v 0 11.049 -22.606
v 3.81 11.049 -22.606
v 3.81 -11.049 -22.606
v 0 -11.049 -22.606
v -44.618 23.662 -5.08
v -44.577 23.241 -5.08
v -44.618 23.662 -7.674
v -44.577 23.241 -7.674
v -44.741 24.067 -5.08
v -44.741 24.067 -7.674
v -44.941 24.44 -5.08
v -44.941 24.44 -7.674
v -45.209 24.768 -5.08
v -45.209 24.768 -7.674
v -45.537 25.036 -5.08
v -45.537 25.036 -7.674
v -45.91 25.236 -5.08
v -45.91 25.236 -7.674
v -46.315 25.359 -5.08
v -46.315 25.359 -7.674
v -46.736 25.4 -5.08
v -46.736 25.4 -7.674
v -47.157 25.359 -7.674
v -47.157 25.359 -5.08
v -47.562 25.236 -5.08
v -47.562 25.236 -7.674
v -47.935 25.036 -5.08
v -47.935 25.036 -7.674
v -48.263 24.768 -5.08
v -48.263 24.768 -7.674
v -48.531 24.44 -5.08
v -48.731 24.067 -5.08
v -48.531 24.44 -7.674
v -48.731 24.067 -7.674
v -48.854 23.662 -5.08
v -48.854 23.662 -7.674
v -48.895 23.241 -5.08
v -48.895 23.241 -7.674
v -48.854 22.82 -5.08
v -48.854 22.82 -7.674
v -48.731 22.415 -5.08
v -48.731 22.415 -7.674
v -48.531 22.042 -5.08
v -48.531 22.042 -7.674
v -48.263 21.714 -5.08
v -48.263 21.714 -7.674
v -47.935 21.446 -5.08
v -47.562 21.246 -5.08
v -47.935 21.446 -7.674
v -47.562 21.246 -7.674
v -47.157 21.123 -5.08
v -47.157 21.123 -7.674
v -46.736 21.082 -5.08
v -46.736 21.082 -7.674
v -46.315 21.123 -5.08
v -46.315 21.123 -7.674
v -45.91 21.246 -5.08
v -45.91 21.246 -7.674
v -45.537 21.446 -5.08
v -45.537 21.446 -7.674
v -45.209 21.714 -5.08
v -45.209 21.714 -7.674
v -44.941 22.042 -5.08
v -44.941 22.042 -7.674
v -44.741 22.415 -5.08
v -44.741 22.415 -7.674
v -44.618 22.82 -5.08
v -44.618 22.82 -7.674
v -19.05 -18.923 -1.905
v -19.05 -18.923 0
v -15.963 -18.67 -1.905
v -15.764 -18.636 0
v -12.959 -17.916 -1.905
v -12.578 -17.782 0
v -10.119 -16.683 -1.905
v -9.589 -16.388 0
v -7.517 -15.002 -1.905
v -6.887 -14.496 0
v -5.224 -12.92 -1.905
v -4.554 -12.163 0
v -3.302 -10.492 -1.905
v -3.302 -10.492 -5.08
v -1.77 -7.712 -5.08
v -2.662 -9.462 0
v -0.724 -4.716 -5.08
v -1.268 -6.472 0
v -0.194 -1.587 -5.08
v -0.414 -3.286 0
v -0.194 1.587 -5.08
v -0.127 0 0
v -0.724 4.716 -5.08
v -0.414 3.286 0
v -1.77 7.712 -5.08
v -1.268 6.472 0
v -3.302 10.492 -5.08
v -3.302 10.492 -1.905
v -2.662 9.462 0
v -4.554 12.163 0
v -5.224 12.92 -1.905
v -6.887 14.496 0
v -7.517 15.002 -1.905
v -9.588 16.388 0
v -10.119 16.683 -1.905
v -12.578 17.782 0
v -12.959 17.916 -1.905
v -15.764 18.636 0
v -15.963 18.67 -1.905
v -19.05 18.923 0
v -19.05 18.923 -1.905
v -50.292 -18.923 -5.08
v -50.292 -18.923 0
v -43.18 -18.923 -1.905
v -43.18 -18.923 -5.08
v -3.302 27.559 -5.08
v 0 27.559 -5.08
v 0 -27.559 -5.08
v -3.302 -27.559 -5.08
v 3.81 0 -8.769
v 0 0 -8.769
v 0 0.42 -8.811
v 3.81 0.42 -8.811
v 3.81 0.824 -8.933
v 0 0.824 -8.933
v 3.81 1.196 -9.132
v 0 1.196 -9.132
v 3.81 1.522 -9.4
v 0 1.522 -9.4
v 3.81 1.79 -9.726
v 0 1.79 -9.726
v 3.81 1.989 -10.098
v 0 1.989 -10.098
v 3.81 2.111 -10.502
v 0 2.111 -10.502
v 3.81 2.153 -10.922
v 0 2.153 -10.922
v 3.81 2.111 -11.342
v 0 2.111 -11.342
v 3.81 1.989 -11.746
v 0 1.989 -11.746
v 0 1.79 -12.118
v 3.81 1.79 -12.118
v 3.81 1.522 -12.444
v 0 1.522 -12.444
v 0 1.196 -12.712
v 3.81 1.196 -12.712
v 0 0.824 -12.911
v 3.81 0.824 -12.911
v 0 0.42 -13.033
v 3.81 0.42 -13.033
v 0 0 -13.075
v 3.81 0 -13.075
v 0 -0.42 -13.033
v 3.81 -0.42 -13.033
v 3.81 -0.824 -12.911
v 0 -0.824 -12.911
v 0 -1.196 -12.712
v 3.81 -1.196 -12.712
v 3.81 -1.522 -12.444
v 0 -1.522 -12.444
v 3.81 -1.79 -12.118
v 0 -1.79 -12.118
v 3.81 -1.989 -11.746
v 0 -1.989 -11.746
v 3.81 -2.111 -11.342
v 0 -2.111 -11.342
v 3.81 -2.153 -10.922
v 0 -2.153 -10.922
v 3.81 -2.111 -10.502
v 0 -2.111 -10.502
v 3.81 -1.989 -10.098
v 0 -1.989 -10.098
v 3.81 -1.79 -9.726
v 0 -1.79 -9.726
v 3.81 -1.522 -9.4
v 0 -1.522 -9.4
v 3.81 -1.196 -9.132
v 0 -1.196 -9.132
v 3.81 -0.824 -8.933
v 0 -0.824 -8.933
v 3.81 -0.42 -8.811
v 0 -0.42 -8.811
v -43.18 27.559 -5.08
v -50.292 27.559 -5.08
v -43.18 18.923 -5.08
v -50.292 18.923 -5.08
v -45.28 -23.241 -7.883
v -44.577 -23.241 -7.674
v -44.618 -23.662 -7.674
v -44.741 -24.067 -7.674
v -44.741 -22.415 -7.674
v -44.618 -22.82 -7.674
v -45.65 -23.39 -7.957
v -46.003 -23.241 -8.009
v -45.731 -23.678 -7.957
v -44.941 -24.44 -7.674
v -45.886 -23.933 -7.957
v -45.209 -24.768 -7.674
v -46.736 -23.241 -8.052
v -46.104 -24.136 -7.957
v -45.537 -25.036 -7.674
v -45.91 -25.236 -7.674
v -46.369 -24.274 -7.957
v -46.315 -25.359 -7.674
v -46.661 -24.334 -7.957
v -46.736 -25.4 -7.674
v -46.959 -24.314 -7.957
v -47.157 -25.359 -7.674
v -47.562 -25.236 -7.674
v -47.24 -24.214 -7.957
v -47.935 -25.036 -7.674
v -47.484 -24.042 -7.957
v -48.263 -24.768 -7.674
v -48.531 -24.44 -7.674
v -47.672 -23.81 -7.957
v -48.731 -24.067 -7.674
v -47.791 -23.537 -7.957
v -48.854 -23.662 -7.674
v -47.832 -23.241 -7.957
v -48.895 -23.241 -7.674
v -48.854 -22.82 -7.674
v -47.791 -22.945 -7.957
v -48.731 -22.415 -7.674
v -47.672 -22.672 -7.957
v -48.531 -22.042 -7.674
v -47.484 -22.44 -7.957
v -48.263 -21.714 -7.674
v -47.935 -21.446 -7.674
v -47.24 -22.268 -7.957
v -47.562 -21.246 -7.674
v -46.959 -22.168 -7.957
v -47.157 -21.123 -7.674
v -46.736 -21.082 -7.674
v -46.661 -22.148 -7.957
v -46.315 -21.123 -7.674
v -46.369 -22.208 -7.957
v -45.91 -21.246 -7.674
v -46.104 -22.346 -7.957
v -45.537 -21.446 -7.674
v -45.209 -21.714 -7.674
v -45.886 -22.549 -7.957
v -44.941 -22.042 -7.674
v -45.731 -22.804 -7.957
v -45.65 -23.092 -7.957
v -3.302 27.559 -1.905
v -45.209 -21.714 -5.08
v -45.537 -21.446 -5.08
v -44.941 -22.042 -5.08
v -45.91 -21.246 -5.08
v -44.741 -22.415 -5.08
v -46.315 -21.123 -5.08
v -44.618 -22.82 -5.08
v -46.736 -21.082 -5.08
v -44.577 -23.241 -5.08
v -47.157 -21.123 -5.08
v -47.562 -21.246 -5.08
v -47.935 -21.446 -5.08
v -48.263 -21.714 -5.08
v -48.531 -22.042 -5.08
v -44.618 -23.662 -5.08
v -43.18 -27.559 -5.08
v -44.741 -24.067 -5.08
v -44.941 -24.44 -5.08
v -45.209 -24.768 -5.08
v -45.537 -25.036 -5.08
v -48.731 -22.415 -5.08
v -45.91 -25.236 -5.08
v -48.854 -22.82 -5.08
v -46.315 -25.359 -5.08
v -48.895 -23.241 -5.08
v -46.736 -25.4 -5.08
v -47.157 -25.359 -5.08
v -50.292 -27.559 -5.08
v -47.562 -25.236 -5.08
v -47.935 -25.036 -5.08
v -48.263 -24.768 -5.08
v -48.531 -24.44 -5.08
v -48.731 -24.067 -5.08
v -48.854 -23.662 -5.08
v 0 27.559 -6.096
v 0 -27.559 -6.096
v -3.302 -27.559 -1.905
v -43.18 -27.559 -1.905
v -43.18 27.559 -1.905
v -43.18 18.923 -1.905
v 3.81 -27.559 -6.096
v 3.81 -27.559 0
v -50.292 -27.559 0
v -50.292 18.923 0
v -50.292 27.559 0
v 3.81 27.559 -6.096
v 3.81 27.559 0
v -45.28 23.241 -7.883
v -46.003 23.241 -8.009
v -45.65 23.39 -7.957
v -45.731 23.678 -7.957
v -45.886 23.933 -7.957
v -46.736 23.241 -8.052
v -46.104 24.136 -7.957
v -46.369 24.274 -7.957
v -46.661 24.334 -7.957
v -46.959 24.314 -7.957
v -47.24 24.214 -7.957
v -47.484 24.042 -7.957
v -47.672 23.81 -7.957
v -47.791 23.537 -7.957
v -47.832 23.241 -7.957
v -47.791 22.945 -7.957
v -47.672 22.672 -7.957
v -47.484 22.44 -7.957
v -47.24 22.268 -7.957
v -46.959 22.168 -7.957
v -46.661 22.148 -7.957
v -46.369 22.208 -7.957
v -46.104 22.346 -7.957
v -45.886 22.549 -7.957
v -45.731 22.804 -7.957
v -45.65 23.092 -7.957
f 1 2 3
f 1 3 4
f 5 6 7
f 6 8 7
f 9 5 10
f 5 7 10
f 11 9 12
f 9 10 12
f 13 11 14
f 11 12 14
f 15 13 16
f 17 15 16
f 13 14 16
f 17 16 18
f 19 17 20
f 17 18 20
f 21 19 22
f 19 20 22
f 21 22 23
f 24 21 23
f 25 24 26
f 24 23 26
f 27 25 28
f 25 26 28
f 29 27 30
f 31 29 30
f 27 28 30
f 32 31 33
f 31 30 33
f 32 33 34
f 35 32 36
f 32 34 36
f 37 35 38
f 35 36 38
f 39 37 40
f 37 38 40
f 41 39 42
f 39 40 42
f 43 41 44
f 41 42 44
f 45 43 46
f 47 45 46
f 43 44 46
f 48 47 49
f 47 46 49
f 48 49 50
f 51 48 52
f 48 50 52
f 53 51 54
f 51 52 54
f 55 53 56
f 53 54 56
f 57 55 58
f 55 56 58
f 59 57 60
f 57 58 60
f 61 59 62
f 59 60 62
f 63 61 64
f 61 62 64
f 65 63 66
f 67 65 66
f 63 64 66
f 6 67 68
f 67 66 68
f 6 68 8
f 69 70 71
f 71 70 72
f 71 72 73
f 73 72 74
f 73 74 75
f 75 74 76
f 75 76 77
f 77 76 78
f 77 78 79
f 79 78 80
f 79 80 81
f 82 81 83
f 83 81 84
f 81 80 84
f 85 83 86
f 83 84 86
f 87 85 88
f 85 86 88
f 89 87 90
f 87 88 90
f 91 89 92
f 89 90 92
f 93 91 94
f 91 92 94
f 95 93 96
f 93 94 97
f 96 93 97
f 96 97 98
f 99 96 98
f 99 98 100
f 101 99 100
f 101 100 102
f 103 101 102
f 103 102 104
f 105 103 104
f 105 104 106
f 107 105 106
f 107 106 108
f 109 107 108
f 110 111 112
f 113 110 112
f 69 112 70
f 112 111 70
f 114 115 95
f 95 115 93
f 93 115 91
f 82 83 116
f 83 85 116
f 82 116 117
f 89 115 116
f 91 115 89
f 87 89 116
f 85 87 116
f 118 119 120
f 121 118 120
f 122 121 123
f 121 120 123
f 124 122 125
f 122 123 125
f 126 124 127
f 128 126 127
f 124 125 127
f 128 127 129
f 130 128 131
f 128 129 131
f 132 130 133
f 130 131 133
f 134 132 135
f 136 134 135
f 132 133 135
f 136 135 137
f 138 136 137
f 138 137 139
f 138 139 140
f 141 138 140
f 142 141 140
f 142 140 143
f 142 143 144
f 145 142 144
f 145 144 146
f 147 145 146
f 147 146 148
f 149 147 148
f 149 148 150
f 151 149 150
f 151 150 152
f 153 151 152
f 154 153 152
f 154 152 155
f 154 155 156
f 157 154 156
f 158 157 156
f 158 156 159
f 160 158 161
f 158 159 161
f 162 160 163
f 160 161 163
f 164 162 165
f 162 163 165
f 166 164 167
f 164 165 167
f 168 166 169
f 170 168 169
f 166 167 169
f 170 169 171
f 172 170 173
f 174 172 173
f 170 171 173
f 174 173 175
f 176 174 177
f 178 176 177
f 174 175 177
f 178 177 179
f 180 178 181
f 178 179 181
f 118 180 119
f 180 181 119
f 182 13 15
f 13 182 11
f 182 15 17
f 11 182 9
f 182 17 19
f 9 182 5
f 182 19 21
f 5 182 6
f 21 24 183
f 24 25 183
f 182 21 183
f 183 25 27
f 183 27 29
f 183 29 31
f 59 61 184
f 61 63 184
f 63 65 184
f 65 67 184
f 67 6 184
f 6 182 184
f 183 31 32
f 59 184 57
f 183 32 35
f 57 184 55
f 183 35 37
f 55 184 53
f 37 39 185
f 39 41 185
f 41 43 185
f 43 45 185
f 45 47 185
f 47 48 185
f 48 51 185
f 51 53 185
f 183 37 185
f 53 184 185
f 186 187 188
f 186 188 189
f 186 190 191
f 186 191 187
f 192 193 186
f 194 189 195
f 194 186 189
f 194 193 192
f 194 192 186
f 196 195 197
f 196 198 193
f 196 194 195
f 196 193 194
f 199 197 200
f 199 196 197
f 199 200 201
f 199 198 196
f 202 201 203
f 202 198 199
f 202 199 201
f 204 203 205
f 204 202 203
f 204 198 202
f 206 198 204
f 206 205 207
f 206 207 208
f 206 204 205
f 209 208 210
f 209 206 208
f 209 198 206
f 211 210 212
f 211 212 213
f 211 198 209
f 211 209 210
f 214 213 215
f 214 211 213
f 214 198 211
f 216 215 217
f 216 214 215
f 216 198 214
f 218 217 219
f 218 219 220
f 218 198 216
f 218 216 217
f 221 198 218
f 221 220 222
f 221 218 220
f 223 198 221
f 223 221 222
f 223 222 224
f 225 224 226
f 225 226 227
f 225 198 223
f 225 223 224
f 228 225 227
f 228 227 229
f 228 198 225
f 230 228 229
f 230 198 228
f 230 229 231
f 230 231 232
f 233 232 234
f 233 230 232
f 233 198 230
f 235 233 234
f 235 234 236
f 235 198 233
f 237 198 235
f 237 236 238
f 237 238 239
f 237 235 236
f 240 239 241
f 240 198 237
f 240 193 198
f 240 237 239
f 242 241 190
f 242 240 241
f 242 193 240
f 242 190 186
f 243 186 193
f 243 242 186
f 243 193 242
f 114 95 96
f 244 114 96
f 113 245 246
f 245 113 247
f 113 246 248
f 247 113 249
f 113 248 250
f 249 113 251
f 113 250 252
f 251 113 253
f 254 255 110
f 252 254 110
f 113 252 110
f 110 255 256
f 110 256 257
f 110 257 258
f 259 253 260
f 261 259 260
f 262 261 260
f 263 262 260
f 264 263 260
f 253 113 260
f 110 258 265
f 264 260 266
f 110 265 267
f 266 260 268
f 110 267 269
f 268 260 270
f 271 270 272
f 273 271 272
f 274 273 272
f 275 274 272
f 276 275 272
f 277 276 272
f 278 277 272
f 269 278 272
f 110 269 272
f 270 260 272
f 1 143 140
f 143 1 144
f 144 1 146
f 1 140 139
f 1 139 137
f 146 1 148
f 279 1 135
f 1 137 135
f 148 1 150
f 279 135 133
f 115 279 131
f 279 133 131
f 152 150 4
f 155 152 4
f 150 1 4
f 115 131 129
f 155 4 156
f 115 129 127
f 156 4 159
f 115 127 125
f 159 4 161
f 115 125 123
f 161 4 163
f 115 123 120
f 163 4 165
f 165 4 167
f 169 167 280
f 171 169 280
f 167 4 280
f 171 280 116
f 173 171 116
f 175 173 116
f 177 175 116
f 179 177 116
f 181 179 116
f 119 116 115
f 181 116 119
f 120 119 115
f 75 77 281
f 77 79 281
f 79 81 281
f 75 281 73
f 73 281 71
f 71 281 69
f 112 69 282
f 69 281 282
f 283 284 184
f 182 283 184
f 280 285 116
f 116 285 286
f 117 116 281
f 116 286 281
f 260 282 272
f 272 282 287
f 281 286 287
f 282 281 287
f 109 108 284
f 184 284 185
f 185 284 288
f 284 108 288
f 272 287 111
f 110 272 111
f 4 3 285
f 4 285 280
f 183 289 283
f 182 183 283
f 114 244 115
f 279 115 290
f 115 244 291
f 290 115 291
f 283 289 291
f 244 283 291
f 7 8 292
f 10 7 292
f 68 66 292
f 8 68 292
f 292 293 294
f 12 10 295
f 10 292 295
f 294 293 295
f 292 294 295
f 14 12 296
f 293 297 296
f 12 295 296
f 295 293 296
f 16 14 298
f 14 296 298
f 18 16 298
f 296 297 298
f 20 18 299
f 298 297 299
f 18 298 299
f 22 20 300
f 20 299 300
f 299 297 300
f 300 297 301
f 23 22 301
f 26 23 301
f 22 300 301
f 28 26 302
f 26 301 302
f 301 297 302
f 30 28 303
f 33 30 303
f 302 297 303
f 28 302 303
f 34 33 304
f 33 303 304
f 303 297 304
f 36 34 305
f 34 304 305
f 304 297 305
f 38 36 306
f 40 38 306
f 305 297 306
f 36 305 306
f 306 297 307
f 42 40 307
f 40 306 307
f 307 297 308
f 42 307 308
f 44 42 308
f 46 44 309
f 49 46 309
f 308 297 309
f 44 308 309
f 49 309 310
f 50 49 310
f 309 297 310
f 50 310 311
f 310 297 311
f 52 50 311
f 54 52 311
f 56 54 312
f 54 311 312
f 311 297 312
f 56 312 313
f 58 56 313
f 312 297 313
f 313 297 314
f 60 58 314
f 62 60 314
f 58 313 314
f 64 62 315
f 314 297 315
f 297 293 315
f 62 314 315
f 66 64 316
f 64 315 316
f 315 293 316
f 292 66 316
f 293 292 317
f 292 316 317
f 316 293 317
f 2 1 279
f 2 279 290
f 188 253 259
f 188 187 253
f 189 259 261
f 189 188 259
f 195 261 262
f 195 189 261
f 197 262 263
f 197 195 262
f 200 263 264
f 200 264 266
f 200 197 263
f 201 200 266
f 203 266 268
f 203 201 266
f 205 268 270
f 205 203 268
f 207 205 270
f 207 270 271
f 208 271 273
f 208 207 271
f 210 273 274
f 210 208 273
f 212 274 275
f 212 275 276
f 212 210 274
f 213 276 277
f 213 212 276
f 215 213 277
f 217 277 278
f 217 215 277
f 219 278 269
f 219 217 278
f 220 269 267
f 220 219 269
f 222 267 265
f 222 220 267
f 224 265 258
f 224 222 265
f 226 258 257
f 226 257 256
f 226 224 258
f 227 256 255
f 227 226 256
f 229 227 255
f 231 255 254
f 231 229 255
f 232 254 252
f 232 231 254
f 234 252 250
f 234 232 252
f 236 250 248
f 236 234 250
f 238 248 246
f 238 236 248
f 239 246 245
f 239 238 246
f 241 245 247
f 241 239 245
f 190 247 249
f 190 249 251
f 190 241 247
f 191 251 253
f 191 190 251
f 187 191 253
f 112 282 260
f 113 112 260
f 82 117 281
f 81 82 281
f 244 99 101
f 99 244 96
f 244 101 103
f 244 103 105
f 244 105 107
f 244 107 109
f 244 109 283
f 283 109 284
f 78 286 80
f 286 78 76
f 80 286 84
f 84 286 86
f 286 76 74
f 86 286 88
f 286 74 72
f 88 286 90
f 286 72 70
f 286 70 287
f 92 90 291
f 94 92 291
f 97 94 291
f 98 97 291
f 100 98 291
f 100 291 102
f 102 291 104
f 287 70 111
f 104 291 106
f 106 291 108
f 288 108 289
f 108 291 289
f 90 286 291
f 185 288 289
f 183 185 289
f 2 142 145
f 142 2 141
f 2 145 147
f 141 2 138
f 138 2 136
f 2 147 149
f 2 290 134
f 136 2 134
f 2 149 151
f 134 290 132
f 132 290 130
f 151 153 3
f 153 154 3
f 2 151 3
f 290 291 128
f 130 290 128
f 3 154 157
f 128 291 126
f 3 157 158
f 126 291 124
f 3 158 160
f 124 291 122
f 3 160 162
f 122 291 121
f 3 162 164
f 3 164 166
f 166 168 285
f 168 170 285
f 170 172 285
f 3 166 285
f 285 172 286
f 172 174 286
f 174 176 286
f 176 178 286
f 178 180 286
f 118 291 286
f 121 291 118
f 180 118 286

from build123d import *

# Parameters (mm, degrees)
BOSS_EXTRUDE1_DEPTH       = 22.606
CUT_EXTRUDE1_DEPTH        = 56.118
F_8_CLEARANCE_HOLE1_D     = 4.3053
F_8_CLEARANCE_HOLE1_DEPTH = 3.81
CHAMFER1_SIZE             = 16.51


with BuildPart() as part:
    # Sketch1 w/mock PCB → Boss-Extrude1 (new body)
    with BuildSketch(Plane.XY):
        with BuildLine():
            Line((-19.05, 18.923), (-50.292, 18.923))
            Line((-50.292, 18.923), (-50.292, 27.559))
            Line((-50.292, 27.559), (3.81, 27.559))
            Line((3.81, 27.559), (3.81, -27.559))
            Line((3.81, -27.559), (-50.292, -27.559))
            Line((-50.292, -27.559), (-50.292, -18.923))
            Line((-50.292, -18.923), (-19.05, -18.923))
            ThreePointArc((-19.05, -18.923), (-0.127, 0), (-19.05, 18.923))
        make_face()
    extrude(amount=-BOSS_EXTRUDE1_DEPTH)

    # Sketch1 → Cut-Extrude1 (cut, through all)
    with BuildSketch(Plane.XZ.offset(27.559)):
        Polygon((-3.302, -5.08), (-3.302, -1.905), (-43.18, -1.905), (-43.18, -5.08), (-50.292, -5.08), (-50.292, -22.606), (0, -22.606), (0, -5.08), align=None)
    extrude(amount=-CUT_EXTRUDE1_DEPTH, mode=Mode.SUBTRACT)

    # #8 Clearance Hole1
    with Locations(Plane(origin=(3.81, 0, 0), x_dir=(0, 0, -1), z_dir=(1, 0, 0))):
        with Locations((10.922, 0)):
            Hole(F_8_CLEARANCE_HOLE1_D / 2, depth=F_8_CLEARANCE_HOLE1_DEPTH)

    # Sketch8 → Revolve1 (revolve)
    with BuildSketch(Plane(origin=(0, 23.241, 0), x_dir=(1, 0, 0), z_dir=(0, 1, 0))):
        with BuildLine():
            Line((-46.736, 8.0518), (-46.736, 5.08))
            Line((-46.736, 5.08), (-44.577, 5.08))
            Line((-44.577, 5.08), (-44.577, 7.673501516))
            ThreePointArc((-44.577, 7.673501516), (-45.640053977, 7.95651041), (-46.736, 8.0518))
        make_face()
    revolve1 = revolve(axis=Axis((-46.736, 23.241, -5.08), (0, 0, 1)))

    # Mirror1: Revolve1 across plane
    add(revolve1.mirror(Plane.ZX))

    # Chamfer1
    chamfer1_edges = [part.edges().sort_by_distance(p)[0] for p in [
        (1.905, -27.559, -22.606),
        (1.905, 27.559, -22.606),
    ]]
    chamfer(chamfer1_edges, length=CHAMFER1_SIZE)


solid = part.part
